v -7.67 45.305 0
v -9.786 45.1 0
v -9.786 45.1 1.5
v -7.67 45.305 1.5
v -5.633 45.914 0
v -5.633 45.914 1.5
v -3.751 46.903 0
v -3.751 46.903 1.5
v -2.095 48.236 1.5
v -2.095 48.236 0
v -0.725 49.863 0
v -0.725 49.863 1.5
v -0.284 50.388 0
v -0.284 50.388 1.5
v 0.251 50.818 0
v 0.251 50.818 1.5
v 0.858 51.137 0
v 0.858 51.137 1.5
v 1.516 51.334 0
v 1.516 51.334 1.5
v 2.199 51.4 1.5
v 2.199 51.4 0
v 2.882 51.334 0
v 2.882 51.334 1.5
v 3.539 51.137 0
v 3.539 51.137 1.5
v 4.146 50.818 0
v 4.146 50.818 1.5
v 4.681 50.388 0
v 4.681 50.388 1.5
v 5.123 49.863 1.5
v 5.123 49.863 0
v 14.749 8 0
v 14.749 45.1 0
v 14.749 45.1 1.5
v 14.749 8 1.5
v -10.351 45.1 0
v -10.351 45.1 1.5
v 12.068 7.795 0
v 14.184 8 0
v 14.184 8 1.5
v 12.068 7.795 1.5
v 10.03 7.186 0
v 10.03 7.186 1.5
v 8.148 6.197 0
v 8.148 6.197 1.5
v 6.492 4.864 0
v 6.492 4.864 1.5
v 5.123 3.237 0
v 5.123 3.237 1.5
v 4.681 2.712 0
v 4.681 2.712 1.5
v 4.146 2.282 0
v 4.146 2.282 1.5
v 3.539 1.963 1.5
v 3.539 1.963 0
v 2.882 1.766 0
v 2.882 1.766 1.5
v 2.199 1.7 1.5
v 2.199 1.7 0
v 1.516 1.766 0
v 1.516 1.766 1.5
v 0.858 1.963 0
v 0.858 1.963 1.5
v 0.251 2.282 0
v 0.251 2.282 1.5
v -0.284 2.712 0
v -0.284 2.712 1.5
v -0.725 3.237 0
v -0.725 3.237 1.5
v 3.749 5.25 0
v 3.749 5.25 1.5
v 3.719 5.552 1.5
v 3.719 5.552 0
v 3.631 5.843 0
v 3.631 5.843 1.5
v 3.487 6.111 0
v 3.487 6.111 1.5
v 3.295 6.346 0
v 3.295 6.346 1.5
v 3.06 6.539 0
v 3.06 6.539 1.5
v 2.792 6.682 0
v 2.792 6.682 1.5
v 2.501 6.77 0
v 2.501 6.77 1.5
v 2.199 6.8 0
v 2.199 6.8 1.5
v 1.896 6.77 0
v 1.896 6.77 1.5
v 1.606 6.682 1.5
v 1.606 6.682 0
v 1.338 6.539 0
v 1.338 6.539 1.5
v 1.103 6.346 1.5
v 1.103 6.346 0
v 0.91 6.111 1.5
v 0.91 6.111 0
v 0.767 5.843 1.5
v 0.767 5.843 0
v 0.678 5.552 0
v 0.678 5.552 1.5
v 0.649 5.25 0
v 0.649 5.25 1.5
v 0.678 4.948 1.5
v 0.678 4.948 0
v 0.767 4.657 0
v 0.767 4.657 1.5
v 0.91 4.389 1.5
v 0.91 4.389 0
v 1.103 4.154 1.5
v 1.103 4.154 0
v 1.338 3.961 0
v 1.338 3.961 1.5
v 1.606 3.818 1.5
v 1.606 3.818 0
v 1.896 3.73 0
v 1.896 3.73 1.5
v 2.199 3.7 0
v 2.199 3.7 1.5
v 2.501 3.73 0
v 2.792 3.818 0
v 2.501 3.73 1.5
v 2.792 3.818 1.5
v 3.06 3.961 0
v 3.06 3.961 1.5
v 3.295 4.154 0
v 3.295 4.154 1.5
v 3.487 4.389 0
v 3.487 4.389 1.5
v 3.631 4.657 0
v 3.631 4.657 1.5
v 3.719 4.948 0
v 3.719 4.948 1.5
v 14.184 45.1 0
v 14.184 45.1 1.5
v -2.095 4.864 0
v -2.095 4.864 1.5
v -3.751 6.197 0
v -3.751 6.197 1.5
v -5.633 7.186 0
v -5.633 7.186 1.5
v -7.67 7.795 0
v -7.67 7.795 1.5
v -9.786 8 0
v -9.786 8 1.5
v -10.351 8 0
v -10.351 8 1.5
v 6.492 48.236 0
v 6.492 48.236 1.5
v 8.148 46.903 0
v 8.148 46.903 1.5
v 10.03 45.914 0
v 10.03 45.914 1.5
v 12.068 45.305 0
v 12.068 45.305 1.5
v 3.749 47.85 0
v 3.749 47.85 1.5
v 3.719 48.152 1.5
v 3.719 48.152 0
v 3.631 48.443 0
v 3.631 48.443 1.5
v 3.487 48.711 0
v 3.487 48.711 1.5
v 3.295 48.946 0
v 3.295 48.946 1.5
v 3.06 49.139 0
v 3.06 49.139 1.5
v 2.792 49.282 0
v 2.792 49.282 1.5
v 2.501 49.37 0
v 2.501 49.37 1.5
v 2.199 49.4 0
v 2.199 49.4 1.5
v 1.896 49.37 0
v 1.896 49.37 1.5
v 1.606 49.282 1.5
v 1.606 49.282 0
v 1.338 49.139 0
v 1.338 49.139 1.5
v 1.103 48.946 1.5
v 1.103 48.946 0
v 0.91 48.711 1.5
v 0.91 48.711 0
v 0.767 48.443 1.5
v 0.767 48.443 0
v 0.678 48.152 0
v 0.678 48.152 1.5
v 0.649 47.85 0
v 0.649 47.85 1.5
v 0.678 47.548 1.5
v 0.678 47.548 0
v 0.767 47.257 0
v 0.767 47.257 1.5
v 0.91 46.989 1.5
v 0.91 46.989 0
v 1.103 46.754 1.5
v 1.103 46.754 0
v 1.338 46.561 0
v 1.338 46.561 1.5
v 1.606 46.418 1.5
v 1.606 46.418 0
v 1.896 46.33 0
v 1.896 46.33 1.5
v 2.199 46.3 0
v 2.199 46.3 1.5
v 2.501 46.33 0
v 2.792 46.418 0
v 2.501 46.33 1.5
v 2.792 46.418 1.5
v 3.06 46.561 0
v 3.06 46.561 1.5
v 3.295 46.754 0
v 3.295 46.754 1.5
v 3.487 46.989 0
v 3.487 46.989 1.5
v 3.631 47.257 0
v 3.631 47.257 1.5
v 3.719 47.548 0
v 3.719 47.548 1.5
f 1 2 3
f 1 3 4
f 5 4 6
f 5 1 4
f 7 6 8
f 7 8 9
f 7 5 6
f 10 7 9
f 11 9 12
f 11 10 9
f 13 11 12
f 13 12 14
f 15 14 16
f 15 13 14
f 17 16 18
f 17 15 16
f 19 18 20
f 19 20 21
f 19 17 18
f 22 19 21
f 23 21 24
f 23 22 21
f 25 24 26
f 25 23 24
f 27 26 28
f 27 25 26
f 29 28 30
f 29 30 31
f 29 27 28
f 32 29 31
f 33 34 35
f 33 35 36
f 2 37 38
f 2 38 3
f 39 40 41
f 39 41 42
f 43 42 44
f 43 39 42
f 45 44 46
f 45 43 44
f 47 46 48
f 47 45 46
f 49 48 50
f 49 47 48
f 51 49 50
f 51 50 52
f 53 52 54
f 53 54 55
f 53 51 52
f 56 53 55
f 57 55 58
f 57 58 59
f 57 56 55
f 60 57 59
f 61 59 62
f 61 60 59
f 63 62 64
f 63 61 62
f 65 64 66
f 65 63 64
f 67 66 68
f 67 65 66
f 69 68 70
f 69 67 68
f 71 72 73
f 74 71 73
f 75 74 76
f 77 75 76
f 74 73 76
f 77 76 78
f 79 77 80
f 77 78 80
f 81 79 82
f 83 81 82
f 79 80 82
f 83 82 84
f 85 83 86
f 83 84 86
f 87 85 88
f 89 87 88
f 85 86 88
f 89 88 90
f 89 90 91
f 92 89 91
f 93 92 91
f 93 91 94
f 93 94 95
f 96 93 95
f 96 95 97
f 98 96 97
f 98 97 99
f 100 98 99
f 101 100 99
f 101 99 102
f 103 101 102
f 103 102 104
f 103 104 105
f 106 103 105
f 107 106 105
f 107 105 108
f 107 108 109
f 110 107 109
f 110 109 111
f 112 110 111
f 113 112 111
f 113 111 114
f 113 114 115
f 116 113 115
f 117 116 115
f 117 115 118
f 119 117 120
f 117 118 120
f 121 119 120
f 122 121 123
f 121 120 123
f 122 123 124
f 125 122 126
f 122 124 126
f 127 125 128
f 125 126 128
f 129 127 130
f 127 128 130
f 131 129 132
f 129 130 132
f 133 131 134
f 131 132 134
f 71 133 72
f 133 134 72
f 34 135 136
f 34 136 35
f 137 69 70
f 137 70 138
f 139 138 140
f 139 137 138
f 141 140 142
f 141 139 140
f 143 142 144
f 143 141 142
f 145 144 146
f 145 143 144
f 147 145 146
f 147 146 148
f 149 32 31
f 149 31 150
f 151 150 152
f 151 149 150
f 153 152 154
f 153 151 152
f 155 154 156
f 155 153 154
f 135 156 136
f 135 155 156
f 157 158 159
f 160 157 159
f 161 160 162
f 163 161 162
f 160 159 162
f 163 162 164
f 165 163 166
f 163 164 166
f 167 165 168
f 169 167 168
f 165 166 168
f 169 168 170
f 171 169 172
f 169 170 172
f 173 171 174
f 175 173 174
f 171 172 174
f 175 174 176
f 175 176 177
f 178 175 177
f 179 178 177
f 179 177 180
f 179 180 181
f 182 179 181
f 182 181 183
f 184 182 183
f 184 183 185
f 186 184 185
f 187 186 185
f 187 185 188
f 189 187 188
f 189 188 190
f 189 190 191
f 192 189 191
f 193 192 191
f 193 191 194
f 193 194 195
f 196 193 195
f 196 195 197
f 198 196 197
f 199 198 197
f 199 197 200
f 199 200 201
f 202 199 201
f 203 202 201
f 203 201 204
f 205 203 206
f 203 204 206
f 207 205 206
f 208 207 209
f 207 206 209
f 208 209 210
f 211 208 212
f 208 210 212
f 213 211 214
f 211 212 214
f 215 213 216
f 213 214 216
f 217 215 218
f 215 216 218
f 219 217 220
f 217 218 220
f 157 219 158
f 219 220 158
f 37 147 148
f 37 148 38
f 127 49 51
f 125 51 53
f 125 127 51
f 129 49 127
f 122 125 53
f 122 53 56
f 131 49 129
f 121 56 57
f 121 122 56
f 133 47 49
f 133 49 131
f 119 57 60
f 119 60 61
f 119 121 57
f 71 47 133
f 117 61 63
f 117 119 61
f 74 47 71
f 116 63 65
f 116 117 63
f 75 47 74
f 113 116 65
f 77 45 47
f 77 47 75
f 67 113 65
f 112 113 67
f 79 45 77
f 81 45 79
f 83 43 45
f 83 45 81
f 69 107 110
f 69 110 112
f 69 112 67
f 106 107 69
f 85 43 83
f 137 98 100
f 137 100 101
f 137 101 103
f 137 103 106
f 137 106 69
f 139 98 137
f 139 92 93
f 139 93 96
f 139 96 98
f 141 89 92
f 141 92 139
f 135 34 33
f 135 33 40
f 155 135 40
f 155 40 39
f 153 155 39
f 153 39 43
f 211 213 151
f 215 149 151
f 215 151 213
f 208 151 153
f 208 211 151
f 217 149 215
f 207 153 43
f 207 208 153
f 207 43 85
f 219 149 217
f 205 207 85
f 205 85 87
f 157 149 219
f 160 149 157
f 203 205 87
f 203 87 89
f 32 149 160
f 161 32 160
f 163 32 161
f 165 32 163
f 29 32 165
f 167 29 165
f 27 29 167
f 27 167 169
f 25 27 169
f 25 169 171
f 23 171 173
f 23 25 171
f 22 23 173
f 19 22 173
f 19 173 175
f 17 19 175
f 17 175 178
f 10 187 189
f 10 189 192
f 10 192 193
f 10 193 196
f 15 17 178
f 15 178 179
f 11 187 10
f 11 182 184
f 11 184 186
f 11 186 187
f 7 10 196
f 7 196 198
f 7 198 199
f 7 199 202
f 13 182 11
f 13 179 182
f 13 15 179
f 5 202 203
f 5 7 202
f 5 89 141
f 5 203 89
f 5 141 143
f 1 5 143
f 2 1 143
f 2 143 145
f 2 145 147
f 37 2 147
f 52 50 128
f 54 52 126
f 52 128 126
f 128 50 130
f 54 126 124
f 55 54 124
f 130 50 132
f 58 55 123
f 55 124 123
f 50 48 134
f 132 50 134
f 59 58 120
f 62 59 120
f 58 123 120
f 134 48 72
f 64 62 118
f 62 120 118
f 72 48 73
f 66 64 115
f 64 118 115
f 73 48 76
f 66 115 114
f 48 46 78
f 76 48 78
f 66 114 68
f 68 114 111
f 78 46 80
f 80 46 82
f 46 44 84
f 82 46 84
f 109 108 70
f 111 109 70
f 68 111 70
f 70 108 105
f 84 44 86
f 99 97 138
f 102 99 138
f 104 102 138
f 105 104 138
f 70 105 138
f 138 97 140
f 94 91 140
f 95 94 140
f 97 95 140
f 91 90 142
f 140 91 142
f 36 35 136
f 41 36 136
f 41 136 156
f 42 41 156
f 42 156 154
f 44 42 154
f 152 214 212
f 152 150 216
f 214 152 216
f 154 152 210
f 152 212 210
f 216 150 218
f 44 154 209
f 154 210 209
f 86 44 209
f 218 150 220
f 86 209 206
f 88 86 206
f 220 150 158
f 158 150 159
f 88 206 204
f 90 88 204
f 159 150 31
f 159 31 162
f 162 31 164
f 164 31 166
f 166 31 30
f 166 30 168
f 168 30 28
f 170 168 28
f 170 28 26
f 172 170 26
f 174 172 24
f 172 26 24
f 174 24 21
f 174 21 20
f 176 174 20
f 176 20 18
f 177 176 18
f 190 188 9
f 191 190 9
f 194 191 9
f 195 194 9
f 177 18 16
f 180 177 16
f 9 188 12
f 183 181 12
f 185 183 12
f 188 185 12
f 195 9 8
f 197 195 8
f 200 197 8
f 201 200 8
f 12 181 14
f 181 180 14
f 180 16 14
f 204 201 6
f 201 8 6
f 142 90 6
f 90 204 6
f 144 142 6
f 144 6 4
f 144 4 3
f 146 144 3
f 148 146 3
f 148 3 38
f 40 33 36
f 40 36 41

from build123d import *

# Parameters (mm, degrees)
BOSS_EXTRUDE1_DEPTH = 1.5
SKETCH2_R           = 1.55
CUT_EXTRUDE1_DEPTH  = 54.49517282


with BuildPart() as part:
    # Sketch1 → Boss-Extrude1 (new body)
    with BuildSketch(Plane.XY):
        with BuildLine():
            Line((-10.351321581, 8), (-10.351321581, 45.1))
            Line((-10.351321581, 45.1), (-9.925677234, 45.1))
            Line((-9.925677234, 45.1), (-9.786312195, 45.1))
            ThreePointArc((-9.786312195, 45.1), (-4.668121471, 46.363259082), (-0.725494549, 49.862886598))
            ThreePointArc((-0.725494549, 49.862886598), (2.198678419, 51.4), (5.122851386, 49.862886598))
            ThreePointArc((5.122851386, 49.862886598), (9.065478308, 46.363259082), (14.183669032, 45.1))
            Line((14.183669032, 45.1), (14.323034072, 45.1))
            Line((14.323034072, 45.1), (14.748678419, 45.1))
            Line((14.748678419, 45.1), (14.748678419, 8))
            Line((14.748678419, 8), (14.183669032, 8))
            ThreePointArc((14.183669032, 8), (9.065478308, 6.736740918), (5.122851386, 3.237113402))
            ThreePointArc((5.122851386, 3.237113402), (2.198678419, 1.7), (-0.725494549, 3.237113402))
            ThreePointArc((-0.725494549, 3.237113402), (-4.668121471, 6.736740918), (-9.786312195, 8))
            Line((-9.786312195, 8), (-10.351321581, 8))
        make_face()
    extrude(amount=BOSS_EXTRUDE1_DEPTH)

    # Sketch2 → Cut-Extrude1 (cut, through all)
    with BuildSketch(Plane.XY.offset(1.5)):
        with Locations((2.198678419, 47.85)):
            Circle(SKETCH2_R)
        with Locations((2.198678419, 5.25)):
            Circle(SKETCH2_R)
    extrude(amount=-CUT_EXTRUDE1_DEPTH, mode=Mode.SUBTRACT)


solid = part.part
